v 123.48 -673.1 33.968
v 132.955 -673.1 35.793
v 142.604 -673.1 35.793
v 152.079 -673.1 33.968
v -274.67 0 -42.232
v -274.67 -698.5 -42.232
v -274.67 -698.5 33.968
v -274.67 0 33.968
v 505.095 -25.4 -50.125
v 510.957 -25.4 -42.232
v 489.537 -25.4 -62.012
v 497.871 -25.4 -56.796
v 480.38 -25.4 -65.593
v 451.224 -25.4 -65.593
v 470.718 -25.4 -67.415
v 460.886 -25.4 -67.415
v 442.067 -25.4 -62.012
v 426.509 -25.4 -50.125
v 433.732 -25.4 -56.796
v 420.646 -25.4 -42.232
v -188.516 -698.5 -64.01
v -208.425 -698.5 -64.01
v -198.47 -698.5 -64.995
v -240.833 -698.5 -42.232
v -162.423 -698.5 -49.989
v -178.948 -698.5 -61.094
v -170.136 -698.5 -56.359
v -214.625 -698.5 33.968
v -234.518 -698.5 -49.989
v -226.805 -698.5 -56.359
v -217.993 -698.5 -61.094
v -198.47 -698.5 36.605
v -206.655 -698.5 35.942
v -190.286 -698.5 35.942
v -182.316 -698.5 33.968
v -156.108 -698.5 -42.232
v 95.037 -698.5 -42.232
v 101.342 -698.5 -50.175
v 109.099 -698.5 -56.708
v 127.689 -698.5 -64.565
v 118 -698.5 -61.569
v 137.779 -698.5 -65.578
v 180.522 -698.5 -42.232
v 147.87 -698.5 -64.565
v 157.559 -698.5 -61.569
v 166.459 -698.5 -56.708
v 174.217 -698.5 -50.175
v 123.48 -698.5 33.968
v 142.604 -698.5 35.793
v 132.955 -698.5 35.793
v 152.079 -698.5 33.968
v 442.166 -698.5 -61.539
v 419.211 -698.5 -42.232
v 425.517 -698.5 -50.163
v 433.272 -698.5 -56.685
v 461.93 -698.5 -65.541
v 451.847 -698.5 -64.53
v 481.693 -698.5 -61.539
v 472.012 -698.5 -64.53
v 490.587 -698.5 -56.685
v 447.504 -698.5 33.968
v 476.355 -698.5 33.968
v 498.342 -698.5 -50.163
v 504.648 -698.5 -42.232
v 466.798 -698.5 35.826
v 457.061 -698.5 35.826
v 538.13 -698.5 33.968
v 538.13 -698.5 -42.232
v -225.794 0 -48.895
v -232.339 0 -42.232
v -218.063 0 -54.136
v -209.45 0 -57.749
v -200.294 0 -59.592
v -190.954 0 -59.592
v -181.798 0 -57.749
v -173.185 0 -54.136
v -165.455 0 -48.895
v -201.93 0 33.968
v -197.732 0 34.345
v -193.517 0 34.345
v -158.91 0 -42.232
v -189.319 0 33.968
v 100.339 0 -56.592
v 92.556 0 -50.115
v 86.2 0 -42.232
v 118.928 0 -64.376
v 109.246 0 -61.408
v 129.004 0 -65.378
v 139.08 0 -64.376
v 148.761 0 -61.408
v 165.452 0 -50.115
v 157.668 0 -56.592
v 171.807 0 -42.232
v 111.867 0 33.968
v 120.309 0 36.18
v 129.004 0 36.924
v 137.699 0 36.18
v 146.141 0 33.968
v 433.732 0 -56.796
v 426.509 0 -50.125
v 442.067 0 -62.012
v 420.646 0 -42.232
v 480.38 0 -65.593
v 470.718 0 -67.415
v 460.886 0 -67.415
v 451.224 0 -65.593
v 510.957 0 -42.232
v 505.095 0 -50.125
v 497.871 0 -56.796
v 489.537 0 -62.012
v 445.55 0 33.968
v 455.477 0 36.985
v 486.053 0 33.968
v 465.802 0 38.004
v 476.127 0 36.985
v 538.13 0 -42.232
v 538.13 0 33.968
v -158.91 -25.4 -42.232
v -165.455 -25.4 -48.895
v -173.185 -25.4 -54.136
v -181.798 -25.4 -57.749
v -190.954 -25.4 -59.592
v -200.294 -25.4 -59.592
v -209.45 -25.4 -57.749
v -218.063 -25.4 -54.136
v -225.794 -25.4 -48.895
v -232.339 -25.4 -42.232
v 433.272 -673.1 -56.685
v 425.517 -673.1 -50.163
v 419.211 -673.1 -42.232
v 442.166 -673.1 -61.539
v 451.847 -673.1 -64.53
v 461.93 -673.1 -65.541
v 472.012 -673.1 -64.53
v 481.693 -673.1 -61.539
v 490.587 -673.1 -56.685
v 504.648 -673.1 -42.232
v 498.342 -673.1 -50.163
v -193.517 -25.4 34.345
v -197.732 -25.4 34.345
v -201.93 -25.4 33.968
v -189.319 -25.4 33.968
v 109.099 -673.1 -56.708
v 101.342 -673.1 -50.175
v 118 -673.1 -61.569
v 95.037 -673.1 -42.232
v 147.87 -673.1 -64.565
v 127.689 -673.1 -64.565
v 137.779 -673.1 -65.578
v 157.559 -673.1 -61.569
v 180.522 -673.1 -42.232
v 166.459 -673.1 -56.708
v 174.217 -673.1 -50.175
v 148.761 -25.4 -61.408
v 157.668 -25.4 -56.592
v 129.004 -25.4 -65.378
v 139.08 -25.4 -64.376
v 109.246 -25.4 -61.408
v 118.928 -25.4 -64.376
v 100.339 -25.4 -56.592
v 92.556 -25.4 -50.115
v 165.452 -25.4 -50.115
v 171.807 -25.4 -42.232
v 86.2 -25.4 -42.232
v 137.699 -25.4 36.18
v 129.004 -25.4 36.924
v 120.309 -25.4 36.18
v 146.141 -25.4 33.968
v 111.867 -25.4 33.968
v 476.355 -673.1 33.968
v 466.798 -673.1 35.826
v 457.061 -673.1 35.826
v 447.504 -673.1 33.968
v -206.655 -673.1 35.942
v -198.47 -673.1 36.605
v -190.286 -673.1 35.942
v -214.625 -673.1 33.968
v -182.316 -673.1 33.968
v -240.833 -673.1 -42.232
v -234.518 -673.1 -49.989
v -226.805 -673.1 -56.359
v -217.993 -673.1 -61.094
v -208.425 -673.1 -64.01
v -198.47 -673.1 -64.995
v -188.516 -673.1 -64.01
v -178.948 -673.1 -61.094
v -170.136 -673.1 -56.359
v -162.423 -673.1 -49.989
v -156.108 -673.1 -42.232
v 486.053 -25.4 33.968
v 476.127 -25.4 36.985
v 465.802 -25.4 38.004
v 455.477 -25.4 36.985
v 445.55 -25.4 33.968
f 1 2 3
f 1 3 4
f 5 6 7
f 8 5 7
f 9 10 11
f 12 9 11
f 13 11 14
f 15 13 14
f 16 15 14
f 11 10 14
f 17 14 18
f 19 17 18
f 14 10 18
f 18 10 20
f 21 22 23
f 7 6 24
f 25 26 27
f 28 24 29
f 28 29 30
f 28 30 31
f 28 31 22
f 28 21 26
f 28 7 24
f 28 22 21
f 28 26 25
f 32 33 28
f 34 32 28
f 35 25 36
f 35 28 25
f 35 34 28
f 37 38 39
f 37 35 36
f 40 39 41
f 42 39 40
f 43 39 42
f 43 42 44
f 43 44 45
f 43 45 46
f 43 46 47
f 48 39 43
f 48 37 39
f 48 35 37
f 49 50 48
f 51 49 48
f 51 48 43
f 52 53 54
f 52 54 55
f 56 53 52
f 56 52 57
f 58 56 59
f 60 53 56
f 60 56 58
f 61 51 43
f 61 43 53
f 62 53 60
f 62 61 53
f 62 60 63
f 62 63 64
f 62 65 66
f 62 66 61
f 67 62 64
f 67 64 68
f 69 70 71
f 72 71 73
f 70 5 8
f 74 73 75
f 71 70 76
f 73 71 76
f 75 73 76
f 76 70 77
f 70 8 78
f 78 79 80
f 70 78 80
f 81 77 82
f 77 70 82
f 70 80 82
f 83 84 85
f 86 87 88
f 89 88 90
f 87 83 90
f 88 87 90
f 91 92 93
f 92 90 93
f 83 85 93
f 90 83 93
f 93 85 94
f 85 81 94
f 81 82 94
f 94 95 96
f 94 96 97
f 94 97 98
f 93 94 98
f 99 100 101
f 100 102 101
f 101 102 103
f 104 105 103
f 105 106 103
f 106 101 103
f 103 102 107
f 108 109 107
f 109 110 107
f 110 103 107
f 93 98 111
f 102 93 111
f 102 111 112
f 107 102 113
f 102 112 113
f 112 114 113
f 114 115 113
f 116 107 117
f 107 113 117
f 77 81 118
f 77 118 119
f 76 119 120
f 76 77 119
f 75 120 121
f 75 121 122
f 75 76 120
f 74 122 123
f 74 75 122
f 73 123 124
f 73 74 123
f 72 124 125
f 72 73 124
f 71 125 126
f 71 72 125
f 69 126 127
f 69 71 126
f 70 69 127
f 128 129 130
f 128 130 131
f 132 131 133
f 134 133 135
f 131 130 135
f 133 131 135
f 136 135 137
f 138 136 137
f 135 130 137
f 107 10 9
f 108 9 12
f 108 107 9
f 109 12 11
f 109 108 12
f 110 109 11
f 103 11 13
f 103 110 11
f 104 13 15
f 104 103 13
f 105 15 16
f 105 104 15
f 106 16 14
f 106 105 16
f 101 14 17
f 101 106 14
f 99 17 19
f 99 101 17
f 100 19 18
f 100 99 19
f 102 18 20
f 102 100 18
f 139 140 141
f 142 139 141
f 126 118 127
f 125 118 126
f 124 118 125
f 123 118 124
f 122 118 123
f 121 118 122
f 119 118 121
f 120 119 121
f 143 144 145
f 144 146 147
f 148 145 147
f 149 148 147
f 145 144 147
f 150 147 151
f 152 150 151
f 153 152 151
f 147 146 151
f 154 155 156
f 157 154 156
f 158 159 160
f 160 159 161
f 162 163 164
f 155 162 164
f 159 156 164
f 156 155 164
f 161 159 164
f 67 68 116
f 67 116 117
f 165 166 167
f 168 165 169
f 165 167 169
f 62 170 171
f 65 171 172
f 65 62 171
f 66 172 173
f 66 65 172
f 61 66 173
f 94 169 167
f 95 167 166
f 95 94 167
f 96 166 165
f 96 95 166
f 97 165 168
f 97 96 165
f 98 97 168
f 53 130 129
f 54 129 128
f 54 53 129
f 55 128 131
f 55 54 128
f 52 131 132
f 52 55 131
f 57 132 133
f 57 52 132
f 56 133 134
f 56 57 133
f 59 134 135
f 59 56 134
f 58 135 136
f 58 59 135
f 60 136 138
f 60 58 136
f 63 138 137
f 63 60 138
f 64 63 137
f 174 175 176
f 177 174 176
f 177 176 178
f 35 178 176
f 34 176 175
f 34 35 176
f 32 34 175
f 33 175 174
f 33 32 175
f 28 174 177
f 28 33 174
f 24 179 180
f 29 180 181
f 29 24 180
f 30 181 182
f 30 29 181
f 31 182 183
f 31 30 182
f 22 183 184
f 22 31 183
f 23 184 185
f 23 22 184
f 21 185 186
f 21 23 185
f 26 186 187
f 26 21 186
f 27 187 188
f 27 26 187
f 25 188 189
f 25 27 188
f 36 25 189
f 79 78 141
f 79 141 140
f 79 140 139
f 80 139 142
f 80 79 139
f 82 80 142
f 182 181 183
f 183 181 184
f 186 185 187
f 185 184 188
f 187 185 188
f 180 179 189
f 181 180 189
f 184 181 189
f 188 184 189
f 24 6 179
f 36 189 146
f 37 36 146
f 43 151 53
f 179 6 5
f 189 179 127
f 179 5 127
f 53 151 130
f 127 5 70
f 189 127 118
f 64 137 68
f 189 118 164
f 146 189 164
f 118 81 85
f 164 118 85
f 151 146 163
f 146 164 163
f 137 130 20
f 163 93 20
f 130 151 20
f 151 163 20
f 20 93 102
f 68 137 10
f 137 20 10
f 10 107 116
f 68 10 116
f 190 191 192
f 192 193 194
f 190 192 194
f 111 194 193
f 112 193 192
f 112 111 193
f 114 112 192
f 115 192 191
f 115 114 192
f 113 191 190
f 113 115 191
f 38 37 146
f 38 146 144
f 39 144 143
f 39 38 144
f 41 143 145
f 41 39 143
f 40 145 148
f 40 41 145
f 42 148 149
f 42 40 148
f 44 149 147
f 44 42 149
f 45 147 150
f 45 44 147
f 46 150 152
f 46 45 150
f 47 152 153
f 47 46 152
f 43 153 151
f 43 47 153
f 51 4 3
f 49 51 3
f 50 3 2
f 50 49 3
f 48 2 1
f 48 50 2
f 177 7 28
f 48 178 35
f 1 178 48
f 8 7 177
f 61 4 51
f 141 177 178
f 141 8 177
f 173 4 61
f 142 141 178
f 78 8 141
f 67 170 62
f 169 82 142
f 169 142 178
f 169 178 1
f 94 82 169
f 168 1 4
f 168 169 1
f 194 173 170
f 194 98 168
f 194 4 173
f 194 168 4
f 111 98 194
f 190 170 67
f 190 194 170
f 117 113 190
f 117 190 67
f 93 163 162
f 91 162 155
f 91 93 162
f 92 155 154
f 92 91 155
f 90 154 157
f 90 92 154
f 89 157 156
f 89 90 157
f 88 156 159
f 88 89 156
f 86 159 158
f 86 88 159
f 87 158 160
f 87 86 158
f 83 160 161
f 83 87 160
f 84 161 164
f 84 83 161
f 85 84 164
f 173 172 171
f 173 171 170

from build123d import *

# Parameters (mm, degrees)
F0_W     = 812.8
F0_H     = 76.2
F1_DEPTH = 698.5
F2_R     = 50.8
F3_DEPTH = 25.4
F5_R     = 52.824269
F5_R_2   = 51.150992
F5_R_3   = 47.107818
F6_DEPTH = 25.4


with BuildPart() as f1:
    # F0 (on Front) → F1 (new body)
    with BuildSketch(Plane.XZ):
        with Locations((131.72951, -4.131862)):
            Rectangle(F0_W, F0_H)
    extrude(amount=F1_DEPTH)

    # F2 (on face) → F3 (join)
    with BuildSketch(Plane.XZ.offset(698.5)):
        with Locations((461.92951, -14.740501)):
            Circle(F2_R)
        with Locations((137.779355, -14.777749)):
            Circle(F2_R)
        with Locations((-198.47049, -14.194834)):
            Circle(F2_R)
    extrude(amount=-F3_DEPTH)

    # F5 (on face) → F6 (join)
    with BuildSketch(Plane(origin=(0, 0, 0), x_dir=(-1, 0, 0), z_dir=(0, 1, 0))):
        with Locations((-465.801656, -14.819974)):
            Circle(F5_R)
        with Locations((-129.003808, -14.226768)):
            Circle(F5_R_2)
        with Locations((195.624262, -12.715756)):
            Circle(F5_R_3)
    extrude(amount=-F6_DEPTH)


solid = f1.part
